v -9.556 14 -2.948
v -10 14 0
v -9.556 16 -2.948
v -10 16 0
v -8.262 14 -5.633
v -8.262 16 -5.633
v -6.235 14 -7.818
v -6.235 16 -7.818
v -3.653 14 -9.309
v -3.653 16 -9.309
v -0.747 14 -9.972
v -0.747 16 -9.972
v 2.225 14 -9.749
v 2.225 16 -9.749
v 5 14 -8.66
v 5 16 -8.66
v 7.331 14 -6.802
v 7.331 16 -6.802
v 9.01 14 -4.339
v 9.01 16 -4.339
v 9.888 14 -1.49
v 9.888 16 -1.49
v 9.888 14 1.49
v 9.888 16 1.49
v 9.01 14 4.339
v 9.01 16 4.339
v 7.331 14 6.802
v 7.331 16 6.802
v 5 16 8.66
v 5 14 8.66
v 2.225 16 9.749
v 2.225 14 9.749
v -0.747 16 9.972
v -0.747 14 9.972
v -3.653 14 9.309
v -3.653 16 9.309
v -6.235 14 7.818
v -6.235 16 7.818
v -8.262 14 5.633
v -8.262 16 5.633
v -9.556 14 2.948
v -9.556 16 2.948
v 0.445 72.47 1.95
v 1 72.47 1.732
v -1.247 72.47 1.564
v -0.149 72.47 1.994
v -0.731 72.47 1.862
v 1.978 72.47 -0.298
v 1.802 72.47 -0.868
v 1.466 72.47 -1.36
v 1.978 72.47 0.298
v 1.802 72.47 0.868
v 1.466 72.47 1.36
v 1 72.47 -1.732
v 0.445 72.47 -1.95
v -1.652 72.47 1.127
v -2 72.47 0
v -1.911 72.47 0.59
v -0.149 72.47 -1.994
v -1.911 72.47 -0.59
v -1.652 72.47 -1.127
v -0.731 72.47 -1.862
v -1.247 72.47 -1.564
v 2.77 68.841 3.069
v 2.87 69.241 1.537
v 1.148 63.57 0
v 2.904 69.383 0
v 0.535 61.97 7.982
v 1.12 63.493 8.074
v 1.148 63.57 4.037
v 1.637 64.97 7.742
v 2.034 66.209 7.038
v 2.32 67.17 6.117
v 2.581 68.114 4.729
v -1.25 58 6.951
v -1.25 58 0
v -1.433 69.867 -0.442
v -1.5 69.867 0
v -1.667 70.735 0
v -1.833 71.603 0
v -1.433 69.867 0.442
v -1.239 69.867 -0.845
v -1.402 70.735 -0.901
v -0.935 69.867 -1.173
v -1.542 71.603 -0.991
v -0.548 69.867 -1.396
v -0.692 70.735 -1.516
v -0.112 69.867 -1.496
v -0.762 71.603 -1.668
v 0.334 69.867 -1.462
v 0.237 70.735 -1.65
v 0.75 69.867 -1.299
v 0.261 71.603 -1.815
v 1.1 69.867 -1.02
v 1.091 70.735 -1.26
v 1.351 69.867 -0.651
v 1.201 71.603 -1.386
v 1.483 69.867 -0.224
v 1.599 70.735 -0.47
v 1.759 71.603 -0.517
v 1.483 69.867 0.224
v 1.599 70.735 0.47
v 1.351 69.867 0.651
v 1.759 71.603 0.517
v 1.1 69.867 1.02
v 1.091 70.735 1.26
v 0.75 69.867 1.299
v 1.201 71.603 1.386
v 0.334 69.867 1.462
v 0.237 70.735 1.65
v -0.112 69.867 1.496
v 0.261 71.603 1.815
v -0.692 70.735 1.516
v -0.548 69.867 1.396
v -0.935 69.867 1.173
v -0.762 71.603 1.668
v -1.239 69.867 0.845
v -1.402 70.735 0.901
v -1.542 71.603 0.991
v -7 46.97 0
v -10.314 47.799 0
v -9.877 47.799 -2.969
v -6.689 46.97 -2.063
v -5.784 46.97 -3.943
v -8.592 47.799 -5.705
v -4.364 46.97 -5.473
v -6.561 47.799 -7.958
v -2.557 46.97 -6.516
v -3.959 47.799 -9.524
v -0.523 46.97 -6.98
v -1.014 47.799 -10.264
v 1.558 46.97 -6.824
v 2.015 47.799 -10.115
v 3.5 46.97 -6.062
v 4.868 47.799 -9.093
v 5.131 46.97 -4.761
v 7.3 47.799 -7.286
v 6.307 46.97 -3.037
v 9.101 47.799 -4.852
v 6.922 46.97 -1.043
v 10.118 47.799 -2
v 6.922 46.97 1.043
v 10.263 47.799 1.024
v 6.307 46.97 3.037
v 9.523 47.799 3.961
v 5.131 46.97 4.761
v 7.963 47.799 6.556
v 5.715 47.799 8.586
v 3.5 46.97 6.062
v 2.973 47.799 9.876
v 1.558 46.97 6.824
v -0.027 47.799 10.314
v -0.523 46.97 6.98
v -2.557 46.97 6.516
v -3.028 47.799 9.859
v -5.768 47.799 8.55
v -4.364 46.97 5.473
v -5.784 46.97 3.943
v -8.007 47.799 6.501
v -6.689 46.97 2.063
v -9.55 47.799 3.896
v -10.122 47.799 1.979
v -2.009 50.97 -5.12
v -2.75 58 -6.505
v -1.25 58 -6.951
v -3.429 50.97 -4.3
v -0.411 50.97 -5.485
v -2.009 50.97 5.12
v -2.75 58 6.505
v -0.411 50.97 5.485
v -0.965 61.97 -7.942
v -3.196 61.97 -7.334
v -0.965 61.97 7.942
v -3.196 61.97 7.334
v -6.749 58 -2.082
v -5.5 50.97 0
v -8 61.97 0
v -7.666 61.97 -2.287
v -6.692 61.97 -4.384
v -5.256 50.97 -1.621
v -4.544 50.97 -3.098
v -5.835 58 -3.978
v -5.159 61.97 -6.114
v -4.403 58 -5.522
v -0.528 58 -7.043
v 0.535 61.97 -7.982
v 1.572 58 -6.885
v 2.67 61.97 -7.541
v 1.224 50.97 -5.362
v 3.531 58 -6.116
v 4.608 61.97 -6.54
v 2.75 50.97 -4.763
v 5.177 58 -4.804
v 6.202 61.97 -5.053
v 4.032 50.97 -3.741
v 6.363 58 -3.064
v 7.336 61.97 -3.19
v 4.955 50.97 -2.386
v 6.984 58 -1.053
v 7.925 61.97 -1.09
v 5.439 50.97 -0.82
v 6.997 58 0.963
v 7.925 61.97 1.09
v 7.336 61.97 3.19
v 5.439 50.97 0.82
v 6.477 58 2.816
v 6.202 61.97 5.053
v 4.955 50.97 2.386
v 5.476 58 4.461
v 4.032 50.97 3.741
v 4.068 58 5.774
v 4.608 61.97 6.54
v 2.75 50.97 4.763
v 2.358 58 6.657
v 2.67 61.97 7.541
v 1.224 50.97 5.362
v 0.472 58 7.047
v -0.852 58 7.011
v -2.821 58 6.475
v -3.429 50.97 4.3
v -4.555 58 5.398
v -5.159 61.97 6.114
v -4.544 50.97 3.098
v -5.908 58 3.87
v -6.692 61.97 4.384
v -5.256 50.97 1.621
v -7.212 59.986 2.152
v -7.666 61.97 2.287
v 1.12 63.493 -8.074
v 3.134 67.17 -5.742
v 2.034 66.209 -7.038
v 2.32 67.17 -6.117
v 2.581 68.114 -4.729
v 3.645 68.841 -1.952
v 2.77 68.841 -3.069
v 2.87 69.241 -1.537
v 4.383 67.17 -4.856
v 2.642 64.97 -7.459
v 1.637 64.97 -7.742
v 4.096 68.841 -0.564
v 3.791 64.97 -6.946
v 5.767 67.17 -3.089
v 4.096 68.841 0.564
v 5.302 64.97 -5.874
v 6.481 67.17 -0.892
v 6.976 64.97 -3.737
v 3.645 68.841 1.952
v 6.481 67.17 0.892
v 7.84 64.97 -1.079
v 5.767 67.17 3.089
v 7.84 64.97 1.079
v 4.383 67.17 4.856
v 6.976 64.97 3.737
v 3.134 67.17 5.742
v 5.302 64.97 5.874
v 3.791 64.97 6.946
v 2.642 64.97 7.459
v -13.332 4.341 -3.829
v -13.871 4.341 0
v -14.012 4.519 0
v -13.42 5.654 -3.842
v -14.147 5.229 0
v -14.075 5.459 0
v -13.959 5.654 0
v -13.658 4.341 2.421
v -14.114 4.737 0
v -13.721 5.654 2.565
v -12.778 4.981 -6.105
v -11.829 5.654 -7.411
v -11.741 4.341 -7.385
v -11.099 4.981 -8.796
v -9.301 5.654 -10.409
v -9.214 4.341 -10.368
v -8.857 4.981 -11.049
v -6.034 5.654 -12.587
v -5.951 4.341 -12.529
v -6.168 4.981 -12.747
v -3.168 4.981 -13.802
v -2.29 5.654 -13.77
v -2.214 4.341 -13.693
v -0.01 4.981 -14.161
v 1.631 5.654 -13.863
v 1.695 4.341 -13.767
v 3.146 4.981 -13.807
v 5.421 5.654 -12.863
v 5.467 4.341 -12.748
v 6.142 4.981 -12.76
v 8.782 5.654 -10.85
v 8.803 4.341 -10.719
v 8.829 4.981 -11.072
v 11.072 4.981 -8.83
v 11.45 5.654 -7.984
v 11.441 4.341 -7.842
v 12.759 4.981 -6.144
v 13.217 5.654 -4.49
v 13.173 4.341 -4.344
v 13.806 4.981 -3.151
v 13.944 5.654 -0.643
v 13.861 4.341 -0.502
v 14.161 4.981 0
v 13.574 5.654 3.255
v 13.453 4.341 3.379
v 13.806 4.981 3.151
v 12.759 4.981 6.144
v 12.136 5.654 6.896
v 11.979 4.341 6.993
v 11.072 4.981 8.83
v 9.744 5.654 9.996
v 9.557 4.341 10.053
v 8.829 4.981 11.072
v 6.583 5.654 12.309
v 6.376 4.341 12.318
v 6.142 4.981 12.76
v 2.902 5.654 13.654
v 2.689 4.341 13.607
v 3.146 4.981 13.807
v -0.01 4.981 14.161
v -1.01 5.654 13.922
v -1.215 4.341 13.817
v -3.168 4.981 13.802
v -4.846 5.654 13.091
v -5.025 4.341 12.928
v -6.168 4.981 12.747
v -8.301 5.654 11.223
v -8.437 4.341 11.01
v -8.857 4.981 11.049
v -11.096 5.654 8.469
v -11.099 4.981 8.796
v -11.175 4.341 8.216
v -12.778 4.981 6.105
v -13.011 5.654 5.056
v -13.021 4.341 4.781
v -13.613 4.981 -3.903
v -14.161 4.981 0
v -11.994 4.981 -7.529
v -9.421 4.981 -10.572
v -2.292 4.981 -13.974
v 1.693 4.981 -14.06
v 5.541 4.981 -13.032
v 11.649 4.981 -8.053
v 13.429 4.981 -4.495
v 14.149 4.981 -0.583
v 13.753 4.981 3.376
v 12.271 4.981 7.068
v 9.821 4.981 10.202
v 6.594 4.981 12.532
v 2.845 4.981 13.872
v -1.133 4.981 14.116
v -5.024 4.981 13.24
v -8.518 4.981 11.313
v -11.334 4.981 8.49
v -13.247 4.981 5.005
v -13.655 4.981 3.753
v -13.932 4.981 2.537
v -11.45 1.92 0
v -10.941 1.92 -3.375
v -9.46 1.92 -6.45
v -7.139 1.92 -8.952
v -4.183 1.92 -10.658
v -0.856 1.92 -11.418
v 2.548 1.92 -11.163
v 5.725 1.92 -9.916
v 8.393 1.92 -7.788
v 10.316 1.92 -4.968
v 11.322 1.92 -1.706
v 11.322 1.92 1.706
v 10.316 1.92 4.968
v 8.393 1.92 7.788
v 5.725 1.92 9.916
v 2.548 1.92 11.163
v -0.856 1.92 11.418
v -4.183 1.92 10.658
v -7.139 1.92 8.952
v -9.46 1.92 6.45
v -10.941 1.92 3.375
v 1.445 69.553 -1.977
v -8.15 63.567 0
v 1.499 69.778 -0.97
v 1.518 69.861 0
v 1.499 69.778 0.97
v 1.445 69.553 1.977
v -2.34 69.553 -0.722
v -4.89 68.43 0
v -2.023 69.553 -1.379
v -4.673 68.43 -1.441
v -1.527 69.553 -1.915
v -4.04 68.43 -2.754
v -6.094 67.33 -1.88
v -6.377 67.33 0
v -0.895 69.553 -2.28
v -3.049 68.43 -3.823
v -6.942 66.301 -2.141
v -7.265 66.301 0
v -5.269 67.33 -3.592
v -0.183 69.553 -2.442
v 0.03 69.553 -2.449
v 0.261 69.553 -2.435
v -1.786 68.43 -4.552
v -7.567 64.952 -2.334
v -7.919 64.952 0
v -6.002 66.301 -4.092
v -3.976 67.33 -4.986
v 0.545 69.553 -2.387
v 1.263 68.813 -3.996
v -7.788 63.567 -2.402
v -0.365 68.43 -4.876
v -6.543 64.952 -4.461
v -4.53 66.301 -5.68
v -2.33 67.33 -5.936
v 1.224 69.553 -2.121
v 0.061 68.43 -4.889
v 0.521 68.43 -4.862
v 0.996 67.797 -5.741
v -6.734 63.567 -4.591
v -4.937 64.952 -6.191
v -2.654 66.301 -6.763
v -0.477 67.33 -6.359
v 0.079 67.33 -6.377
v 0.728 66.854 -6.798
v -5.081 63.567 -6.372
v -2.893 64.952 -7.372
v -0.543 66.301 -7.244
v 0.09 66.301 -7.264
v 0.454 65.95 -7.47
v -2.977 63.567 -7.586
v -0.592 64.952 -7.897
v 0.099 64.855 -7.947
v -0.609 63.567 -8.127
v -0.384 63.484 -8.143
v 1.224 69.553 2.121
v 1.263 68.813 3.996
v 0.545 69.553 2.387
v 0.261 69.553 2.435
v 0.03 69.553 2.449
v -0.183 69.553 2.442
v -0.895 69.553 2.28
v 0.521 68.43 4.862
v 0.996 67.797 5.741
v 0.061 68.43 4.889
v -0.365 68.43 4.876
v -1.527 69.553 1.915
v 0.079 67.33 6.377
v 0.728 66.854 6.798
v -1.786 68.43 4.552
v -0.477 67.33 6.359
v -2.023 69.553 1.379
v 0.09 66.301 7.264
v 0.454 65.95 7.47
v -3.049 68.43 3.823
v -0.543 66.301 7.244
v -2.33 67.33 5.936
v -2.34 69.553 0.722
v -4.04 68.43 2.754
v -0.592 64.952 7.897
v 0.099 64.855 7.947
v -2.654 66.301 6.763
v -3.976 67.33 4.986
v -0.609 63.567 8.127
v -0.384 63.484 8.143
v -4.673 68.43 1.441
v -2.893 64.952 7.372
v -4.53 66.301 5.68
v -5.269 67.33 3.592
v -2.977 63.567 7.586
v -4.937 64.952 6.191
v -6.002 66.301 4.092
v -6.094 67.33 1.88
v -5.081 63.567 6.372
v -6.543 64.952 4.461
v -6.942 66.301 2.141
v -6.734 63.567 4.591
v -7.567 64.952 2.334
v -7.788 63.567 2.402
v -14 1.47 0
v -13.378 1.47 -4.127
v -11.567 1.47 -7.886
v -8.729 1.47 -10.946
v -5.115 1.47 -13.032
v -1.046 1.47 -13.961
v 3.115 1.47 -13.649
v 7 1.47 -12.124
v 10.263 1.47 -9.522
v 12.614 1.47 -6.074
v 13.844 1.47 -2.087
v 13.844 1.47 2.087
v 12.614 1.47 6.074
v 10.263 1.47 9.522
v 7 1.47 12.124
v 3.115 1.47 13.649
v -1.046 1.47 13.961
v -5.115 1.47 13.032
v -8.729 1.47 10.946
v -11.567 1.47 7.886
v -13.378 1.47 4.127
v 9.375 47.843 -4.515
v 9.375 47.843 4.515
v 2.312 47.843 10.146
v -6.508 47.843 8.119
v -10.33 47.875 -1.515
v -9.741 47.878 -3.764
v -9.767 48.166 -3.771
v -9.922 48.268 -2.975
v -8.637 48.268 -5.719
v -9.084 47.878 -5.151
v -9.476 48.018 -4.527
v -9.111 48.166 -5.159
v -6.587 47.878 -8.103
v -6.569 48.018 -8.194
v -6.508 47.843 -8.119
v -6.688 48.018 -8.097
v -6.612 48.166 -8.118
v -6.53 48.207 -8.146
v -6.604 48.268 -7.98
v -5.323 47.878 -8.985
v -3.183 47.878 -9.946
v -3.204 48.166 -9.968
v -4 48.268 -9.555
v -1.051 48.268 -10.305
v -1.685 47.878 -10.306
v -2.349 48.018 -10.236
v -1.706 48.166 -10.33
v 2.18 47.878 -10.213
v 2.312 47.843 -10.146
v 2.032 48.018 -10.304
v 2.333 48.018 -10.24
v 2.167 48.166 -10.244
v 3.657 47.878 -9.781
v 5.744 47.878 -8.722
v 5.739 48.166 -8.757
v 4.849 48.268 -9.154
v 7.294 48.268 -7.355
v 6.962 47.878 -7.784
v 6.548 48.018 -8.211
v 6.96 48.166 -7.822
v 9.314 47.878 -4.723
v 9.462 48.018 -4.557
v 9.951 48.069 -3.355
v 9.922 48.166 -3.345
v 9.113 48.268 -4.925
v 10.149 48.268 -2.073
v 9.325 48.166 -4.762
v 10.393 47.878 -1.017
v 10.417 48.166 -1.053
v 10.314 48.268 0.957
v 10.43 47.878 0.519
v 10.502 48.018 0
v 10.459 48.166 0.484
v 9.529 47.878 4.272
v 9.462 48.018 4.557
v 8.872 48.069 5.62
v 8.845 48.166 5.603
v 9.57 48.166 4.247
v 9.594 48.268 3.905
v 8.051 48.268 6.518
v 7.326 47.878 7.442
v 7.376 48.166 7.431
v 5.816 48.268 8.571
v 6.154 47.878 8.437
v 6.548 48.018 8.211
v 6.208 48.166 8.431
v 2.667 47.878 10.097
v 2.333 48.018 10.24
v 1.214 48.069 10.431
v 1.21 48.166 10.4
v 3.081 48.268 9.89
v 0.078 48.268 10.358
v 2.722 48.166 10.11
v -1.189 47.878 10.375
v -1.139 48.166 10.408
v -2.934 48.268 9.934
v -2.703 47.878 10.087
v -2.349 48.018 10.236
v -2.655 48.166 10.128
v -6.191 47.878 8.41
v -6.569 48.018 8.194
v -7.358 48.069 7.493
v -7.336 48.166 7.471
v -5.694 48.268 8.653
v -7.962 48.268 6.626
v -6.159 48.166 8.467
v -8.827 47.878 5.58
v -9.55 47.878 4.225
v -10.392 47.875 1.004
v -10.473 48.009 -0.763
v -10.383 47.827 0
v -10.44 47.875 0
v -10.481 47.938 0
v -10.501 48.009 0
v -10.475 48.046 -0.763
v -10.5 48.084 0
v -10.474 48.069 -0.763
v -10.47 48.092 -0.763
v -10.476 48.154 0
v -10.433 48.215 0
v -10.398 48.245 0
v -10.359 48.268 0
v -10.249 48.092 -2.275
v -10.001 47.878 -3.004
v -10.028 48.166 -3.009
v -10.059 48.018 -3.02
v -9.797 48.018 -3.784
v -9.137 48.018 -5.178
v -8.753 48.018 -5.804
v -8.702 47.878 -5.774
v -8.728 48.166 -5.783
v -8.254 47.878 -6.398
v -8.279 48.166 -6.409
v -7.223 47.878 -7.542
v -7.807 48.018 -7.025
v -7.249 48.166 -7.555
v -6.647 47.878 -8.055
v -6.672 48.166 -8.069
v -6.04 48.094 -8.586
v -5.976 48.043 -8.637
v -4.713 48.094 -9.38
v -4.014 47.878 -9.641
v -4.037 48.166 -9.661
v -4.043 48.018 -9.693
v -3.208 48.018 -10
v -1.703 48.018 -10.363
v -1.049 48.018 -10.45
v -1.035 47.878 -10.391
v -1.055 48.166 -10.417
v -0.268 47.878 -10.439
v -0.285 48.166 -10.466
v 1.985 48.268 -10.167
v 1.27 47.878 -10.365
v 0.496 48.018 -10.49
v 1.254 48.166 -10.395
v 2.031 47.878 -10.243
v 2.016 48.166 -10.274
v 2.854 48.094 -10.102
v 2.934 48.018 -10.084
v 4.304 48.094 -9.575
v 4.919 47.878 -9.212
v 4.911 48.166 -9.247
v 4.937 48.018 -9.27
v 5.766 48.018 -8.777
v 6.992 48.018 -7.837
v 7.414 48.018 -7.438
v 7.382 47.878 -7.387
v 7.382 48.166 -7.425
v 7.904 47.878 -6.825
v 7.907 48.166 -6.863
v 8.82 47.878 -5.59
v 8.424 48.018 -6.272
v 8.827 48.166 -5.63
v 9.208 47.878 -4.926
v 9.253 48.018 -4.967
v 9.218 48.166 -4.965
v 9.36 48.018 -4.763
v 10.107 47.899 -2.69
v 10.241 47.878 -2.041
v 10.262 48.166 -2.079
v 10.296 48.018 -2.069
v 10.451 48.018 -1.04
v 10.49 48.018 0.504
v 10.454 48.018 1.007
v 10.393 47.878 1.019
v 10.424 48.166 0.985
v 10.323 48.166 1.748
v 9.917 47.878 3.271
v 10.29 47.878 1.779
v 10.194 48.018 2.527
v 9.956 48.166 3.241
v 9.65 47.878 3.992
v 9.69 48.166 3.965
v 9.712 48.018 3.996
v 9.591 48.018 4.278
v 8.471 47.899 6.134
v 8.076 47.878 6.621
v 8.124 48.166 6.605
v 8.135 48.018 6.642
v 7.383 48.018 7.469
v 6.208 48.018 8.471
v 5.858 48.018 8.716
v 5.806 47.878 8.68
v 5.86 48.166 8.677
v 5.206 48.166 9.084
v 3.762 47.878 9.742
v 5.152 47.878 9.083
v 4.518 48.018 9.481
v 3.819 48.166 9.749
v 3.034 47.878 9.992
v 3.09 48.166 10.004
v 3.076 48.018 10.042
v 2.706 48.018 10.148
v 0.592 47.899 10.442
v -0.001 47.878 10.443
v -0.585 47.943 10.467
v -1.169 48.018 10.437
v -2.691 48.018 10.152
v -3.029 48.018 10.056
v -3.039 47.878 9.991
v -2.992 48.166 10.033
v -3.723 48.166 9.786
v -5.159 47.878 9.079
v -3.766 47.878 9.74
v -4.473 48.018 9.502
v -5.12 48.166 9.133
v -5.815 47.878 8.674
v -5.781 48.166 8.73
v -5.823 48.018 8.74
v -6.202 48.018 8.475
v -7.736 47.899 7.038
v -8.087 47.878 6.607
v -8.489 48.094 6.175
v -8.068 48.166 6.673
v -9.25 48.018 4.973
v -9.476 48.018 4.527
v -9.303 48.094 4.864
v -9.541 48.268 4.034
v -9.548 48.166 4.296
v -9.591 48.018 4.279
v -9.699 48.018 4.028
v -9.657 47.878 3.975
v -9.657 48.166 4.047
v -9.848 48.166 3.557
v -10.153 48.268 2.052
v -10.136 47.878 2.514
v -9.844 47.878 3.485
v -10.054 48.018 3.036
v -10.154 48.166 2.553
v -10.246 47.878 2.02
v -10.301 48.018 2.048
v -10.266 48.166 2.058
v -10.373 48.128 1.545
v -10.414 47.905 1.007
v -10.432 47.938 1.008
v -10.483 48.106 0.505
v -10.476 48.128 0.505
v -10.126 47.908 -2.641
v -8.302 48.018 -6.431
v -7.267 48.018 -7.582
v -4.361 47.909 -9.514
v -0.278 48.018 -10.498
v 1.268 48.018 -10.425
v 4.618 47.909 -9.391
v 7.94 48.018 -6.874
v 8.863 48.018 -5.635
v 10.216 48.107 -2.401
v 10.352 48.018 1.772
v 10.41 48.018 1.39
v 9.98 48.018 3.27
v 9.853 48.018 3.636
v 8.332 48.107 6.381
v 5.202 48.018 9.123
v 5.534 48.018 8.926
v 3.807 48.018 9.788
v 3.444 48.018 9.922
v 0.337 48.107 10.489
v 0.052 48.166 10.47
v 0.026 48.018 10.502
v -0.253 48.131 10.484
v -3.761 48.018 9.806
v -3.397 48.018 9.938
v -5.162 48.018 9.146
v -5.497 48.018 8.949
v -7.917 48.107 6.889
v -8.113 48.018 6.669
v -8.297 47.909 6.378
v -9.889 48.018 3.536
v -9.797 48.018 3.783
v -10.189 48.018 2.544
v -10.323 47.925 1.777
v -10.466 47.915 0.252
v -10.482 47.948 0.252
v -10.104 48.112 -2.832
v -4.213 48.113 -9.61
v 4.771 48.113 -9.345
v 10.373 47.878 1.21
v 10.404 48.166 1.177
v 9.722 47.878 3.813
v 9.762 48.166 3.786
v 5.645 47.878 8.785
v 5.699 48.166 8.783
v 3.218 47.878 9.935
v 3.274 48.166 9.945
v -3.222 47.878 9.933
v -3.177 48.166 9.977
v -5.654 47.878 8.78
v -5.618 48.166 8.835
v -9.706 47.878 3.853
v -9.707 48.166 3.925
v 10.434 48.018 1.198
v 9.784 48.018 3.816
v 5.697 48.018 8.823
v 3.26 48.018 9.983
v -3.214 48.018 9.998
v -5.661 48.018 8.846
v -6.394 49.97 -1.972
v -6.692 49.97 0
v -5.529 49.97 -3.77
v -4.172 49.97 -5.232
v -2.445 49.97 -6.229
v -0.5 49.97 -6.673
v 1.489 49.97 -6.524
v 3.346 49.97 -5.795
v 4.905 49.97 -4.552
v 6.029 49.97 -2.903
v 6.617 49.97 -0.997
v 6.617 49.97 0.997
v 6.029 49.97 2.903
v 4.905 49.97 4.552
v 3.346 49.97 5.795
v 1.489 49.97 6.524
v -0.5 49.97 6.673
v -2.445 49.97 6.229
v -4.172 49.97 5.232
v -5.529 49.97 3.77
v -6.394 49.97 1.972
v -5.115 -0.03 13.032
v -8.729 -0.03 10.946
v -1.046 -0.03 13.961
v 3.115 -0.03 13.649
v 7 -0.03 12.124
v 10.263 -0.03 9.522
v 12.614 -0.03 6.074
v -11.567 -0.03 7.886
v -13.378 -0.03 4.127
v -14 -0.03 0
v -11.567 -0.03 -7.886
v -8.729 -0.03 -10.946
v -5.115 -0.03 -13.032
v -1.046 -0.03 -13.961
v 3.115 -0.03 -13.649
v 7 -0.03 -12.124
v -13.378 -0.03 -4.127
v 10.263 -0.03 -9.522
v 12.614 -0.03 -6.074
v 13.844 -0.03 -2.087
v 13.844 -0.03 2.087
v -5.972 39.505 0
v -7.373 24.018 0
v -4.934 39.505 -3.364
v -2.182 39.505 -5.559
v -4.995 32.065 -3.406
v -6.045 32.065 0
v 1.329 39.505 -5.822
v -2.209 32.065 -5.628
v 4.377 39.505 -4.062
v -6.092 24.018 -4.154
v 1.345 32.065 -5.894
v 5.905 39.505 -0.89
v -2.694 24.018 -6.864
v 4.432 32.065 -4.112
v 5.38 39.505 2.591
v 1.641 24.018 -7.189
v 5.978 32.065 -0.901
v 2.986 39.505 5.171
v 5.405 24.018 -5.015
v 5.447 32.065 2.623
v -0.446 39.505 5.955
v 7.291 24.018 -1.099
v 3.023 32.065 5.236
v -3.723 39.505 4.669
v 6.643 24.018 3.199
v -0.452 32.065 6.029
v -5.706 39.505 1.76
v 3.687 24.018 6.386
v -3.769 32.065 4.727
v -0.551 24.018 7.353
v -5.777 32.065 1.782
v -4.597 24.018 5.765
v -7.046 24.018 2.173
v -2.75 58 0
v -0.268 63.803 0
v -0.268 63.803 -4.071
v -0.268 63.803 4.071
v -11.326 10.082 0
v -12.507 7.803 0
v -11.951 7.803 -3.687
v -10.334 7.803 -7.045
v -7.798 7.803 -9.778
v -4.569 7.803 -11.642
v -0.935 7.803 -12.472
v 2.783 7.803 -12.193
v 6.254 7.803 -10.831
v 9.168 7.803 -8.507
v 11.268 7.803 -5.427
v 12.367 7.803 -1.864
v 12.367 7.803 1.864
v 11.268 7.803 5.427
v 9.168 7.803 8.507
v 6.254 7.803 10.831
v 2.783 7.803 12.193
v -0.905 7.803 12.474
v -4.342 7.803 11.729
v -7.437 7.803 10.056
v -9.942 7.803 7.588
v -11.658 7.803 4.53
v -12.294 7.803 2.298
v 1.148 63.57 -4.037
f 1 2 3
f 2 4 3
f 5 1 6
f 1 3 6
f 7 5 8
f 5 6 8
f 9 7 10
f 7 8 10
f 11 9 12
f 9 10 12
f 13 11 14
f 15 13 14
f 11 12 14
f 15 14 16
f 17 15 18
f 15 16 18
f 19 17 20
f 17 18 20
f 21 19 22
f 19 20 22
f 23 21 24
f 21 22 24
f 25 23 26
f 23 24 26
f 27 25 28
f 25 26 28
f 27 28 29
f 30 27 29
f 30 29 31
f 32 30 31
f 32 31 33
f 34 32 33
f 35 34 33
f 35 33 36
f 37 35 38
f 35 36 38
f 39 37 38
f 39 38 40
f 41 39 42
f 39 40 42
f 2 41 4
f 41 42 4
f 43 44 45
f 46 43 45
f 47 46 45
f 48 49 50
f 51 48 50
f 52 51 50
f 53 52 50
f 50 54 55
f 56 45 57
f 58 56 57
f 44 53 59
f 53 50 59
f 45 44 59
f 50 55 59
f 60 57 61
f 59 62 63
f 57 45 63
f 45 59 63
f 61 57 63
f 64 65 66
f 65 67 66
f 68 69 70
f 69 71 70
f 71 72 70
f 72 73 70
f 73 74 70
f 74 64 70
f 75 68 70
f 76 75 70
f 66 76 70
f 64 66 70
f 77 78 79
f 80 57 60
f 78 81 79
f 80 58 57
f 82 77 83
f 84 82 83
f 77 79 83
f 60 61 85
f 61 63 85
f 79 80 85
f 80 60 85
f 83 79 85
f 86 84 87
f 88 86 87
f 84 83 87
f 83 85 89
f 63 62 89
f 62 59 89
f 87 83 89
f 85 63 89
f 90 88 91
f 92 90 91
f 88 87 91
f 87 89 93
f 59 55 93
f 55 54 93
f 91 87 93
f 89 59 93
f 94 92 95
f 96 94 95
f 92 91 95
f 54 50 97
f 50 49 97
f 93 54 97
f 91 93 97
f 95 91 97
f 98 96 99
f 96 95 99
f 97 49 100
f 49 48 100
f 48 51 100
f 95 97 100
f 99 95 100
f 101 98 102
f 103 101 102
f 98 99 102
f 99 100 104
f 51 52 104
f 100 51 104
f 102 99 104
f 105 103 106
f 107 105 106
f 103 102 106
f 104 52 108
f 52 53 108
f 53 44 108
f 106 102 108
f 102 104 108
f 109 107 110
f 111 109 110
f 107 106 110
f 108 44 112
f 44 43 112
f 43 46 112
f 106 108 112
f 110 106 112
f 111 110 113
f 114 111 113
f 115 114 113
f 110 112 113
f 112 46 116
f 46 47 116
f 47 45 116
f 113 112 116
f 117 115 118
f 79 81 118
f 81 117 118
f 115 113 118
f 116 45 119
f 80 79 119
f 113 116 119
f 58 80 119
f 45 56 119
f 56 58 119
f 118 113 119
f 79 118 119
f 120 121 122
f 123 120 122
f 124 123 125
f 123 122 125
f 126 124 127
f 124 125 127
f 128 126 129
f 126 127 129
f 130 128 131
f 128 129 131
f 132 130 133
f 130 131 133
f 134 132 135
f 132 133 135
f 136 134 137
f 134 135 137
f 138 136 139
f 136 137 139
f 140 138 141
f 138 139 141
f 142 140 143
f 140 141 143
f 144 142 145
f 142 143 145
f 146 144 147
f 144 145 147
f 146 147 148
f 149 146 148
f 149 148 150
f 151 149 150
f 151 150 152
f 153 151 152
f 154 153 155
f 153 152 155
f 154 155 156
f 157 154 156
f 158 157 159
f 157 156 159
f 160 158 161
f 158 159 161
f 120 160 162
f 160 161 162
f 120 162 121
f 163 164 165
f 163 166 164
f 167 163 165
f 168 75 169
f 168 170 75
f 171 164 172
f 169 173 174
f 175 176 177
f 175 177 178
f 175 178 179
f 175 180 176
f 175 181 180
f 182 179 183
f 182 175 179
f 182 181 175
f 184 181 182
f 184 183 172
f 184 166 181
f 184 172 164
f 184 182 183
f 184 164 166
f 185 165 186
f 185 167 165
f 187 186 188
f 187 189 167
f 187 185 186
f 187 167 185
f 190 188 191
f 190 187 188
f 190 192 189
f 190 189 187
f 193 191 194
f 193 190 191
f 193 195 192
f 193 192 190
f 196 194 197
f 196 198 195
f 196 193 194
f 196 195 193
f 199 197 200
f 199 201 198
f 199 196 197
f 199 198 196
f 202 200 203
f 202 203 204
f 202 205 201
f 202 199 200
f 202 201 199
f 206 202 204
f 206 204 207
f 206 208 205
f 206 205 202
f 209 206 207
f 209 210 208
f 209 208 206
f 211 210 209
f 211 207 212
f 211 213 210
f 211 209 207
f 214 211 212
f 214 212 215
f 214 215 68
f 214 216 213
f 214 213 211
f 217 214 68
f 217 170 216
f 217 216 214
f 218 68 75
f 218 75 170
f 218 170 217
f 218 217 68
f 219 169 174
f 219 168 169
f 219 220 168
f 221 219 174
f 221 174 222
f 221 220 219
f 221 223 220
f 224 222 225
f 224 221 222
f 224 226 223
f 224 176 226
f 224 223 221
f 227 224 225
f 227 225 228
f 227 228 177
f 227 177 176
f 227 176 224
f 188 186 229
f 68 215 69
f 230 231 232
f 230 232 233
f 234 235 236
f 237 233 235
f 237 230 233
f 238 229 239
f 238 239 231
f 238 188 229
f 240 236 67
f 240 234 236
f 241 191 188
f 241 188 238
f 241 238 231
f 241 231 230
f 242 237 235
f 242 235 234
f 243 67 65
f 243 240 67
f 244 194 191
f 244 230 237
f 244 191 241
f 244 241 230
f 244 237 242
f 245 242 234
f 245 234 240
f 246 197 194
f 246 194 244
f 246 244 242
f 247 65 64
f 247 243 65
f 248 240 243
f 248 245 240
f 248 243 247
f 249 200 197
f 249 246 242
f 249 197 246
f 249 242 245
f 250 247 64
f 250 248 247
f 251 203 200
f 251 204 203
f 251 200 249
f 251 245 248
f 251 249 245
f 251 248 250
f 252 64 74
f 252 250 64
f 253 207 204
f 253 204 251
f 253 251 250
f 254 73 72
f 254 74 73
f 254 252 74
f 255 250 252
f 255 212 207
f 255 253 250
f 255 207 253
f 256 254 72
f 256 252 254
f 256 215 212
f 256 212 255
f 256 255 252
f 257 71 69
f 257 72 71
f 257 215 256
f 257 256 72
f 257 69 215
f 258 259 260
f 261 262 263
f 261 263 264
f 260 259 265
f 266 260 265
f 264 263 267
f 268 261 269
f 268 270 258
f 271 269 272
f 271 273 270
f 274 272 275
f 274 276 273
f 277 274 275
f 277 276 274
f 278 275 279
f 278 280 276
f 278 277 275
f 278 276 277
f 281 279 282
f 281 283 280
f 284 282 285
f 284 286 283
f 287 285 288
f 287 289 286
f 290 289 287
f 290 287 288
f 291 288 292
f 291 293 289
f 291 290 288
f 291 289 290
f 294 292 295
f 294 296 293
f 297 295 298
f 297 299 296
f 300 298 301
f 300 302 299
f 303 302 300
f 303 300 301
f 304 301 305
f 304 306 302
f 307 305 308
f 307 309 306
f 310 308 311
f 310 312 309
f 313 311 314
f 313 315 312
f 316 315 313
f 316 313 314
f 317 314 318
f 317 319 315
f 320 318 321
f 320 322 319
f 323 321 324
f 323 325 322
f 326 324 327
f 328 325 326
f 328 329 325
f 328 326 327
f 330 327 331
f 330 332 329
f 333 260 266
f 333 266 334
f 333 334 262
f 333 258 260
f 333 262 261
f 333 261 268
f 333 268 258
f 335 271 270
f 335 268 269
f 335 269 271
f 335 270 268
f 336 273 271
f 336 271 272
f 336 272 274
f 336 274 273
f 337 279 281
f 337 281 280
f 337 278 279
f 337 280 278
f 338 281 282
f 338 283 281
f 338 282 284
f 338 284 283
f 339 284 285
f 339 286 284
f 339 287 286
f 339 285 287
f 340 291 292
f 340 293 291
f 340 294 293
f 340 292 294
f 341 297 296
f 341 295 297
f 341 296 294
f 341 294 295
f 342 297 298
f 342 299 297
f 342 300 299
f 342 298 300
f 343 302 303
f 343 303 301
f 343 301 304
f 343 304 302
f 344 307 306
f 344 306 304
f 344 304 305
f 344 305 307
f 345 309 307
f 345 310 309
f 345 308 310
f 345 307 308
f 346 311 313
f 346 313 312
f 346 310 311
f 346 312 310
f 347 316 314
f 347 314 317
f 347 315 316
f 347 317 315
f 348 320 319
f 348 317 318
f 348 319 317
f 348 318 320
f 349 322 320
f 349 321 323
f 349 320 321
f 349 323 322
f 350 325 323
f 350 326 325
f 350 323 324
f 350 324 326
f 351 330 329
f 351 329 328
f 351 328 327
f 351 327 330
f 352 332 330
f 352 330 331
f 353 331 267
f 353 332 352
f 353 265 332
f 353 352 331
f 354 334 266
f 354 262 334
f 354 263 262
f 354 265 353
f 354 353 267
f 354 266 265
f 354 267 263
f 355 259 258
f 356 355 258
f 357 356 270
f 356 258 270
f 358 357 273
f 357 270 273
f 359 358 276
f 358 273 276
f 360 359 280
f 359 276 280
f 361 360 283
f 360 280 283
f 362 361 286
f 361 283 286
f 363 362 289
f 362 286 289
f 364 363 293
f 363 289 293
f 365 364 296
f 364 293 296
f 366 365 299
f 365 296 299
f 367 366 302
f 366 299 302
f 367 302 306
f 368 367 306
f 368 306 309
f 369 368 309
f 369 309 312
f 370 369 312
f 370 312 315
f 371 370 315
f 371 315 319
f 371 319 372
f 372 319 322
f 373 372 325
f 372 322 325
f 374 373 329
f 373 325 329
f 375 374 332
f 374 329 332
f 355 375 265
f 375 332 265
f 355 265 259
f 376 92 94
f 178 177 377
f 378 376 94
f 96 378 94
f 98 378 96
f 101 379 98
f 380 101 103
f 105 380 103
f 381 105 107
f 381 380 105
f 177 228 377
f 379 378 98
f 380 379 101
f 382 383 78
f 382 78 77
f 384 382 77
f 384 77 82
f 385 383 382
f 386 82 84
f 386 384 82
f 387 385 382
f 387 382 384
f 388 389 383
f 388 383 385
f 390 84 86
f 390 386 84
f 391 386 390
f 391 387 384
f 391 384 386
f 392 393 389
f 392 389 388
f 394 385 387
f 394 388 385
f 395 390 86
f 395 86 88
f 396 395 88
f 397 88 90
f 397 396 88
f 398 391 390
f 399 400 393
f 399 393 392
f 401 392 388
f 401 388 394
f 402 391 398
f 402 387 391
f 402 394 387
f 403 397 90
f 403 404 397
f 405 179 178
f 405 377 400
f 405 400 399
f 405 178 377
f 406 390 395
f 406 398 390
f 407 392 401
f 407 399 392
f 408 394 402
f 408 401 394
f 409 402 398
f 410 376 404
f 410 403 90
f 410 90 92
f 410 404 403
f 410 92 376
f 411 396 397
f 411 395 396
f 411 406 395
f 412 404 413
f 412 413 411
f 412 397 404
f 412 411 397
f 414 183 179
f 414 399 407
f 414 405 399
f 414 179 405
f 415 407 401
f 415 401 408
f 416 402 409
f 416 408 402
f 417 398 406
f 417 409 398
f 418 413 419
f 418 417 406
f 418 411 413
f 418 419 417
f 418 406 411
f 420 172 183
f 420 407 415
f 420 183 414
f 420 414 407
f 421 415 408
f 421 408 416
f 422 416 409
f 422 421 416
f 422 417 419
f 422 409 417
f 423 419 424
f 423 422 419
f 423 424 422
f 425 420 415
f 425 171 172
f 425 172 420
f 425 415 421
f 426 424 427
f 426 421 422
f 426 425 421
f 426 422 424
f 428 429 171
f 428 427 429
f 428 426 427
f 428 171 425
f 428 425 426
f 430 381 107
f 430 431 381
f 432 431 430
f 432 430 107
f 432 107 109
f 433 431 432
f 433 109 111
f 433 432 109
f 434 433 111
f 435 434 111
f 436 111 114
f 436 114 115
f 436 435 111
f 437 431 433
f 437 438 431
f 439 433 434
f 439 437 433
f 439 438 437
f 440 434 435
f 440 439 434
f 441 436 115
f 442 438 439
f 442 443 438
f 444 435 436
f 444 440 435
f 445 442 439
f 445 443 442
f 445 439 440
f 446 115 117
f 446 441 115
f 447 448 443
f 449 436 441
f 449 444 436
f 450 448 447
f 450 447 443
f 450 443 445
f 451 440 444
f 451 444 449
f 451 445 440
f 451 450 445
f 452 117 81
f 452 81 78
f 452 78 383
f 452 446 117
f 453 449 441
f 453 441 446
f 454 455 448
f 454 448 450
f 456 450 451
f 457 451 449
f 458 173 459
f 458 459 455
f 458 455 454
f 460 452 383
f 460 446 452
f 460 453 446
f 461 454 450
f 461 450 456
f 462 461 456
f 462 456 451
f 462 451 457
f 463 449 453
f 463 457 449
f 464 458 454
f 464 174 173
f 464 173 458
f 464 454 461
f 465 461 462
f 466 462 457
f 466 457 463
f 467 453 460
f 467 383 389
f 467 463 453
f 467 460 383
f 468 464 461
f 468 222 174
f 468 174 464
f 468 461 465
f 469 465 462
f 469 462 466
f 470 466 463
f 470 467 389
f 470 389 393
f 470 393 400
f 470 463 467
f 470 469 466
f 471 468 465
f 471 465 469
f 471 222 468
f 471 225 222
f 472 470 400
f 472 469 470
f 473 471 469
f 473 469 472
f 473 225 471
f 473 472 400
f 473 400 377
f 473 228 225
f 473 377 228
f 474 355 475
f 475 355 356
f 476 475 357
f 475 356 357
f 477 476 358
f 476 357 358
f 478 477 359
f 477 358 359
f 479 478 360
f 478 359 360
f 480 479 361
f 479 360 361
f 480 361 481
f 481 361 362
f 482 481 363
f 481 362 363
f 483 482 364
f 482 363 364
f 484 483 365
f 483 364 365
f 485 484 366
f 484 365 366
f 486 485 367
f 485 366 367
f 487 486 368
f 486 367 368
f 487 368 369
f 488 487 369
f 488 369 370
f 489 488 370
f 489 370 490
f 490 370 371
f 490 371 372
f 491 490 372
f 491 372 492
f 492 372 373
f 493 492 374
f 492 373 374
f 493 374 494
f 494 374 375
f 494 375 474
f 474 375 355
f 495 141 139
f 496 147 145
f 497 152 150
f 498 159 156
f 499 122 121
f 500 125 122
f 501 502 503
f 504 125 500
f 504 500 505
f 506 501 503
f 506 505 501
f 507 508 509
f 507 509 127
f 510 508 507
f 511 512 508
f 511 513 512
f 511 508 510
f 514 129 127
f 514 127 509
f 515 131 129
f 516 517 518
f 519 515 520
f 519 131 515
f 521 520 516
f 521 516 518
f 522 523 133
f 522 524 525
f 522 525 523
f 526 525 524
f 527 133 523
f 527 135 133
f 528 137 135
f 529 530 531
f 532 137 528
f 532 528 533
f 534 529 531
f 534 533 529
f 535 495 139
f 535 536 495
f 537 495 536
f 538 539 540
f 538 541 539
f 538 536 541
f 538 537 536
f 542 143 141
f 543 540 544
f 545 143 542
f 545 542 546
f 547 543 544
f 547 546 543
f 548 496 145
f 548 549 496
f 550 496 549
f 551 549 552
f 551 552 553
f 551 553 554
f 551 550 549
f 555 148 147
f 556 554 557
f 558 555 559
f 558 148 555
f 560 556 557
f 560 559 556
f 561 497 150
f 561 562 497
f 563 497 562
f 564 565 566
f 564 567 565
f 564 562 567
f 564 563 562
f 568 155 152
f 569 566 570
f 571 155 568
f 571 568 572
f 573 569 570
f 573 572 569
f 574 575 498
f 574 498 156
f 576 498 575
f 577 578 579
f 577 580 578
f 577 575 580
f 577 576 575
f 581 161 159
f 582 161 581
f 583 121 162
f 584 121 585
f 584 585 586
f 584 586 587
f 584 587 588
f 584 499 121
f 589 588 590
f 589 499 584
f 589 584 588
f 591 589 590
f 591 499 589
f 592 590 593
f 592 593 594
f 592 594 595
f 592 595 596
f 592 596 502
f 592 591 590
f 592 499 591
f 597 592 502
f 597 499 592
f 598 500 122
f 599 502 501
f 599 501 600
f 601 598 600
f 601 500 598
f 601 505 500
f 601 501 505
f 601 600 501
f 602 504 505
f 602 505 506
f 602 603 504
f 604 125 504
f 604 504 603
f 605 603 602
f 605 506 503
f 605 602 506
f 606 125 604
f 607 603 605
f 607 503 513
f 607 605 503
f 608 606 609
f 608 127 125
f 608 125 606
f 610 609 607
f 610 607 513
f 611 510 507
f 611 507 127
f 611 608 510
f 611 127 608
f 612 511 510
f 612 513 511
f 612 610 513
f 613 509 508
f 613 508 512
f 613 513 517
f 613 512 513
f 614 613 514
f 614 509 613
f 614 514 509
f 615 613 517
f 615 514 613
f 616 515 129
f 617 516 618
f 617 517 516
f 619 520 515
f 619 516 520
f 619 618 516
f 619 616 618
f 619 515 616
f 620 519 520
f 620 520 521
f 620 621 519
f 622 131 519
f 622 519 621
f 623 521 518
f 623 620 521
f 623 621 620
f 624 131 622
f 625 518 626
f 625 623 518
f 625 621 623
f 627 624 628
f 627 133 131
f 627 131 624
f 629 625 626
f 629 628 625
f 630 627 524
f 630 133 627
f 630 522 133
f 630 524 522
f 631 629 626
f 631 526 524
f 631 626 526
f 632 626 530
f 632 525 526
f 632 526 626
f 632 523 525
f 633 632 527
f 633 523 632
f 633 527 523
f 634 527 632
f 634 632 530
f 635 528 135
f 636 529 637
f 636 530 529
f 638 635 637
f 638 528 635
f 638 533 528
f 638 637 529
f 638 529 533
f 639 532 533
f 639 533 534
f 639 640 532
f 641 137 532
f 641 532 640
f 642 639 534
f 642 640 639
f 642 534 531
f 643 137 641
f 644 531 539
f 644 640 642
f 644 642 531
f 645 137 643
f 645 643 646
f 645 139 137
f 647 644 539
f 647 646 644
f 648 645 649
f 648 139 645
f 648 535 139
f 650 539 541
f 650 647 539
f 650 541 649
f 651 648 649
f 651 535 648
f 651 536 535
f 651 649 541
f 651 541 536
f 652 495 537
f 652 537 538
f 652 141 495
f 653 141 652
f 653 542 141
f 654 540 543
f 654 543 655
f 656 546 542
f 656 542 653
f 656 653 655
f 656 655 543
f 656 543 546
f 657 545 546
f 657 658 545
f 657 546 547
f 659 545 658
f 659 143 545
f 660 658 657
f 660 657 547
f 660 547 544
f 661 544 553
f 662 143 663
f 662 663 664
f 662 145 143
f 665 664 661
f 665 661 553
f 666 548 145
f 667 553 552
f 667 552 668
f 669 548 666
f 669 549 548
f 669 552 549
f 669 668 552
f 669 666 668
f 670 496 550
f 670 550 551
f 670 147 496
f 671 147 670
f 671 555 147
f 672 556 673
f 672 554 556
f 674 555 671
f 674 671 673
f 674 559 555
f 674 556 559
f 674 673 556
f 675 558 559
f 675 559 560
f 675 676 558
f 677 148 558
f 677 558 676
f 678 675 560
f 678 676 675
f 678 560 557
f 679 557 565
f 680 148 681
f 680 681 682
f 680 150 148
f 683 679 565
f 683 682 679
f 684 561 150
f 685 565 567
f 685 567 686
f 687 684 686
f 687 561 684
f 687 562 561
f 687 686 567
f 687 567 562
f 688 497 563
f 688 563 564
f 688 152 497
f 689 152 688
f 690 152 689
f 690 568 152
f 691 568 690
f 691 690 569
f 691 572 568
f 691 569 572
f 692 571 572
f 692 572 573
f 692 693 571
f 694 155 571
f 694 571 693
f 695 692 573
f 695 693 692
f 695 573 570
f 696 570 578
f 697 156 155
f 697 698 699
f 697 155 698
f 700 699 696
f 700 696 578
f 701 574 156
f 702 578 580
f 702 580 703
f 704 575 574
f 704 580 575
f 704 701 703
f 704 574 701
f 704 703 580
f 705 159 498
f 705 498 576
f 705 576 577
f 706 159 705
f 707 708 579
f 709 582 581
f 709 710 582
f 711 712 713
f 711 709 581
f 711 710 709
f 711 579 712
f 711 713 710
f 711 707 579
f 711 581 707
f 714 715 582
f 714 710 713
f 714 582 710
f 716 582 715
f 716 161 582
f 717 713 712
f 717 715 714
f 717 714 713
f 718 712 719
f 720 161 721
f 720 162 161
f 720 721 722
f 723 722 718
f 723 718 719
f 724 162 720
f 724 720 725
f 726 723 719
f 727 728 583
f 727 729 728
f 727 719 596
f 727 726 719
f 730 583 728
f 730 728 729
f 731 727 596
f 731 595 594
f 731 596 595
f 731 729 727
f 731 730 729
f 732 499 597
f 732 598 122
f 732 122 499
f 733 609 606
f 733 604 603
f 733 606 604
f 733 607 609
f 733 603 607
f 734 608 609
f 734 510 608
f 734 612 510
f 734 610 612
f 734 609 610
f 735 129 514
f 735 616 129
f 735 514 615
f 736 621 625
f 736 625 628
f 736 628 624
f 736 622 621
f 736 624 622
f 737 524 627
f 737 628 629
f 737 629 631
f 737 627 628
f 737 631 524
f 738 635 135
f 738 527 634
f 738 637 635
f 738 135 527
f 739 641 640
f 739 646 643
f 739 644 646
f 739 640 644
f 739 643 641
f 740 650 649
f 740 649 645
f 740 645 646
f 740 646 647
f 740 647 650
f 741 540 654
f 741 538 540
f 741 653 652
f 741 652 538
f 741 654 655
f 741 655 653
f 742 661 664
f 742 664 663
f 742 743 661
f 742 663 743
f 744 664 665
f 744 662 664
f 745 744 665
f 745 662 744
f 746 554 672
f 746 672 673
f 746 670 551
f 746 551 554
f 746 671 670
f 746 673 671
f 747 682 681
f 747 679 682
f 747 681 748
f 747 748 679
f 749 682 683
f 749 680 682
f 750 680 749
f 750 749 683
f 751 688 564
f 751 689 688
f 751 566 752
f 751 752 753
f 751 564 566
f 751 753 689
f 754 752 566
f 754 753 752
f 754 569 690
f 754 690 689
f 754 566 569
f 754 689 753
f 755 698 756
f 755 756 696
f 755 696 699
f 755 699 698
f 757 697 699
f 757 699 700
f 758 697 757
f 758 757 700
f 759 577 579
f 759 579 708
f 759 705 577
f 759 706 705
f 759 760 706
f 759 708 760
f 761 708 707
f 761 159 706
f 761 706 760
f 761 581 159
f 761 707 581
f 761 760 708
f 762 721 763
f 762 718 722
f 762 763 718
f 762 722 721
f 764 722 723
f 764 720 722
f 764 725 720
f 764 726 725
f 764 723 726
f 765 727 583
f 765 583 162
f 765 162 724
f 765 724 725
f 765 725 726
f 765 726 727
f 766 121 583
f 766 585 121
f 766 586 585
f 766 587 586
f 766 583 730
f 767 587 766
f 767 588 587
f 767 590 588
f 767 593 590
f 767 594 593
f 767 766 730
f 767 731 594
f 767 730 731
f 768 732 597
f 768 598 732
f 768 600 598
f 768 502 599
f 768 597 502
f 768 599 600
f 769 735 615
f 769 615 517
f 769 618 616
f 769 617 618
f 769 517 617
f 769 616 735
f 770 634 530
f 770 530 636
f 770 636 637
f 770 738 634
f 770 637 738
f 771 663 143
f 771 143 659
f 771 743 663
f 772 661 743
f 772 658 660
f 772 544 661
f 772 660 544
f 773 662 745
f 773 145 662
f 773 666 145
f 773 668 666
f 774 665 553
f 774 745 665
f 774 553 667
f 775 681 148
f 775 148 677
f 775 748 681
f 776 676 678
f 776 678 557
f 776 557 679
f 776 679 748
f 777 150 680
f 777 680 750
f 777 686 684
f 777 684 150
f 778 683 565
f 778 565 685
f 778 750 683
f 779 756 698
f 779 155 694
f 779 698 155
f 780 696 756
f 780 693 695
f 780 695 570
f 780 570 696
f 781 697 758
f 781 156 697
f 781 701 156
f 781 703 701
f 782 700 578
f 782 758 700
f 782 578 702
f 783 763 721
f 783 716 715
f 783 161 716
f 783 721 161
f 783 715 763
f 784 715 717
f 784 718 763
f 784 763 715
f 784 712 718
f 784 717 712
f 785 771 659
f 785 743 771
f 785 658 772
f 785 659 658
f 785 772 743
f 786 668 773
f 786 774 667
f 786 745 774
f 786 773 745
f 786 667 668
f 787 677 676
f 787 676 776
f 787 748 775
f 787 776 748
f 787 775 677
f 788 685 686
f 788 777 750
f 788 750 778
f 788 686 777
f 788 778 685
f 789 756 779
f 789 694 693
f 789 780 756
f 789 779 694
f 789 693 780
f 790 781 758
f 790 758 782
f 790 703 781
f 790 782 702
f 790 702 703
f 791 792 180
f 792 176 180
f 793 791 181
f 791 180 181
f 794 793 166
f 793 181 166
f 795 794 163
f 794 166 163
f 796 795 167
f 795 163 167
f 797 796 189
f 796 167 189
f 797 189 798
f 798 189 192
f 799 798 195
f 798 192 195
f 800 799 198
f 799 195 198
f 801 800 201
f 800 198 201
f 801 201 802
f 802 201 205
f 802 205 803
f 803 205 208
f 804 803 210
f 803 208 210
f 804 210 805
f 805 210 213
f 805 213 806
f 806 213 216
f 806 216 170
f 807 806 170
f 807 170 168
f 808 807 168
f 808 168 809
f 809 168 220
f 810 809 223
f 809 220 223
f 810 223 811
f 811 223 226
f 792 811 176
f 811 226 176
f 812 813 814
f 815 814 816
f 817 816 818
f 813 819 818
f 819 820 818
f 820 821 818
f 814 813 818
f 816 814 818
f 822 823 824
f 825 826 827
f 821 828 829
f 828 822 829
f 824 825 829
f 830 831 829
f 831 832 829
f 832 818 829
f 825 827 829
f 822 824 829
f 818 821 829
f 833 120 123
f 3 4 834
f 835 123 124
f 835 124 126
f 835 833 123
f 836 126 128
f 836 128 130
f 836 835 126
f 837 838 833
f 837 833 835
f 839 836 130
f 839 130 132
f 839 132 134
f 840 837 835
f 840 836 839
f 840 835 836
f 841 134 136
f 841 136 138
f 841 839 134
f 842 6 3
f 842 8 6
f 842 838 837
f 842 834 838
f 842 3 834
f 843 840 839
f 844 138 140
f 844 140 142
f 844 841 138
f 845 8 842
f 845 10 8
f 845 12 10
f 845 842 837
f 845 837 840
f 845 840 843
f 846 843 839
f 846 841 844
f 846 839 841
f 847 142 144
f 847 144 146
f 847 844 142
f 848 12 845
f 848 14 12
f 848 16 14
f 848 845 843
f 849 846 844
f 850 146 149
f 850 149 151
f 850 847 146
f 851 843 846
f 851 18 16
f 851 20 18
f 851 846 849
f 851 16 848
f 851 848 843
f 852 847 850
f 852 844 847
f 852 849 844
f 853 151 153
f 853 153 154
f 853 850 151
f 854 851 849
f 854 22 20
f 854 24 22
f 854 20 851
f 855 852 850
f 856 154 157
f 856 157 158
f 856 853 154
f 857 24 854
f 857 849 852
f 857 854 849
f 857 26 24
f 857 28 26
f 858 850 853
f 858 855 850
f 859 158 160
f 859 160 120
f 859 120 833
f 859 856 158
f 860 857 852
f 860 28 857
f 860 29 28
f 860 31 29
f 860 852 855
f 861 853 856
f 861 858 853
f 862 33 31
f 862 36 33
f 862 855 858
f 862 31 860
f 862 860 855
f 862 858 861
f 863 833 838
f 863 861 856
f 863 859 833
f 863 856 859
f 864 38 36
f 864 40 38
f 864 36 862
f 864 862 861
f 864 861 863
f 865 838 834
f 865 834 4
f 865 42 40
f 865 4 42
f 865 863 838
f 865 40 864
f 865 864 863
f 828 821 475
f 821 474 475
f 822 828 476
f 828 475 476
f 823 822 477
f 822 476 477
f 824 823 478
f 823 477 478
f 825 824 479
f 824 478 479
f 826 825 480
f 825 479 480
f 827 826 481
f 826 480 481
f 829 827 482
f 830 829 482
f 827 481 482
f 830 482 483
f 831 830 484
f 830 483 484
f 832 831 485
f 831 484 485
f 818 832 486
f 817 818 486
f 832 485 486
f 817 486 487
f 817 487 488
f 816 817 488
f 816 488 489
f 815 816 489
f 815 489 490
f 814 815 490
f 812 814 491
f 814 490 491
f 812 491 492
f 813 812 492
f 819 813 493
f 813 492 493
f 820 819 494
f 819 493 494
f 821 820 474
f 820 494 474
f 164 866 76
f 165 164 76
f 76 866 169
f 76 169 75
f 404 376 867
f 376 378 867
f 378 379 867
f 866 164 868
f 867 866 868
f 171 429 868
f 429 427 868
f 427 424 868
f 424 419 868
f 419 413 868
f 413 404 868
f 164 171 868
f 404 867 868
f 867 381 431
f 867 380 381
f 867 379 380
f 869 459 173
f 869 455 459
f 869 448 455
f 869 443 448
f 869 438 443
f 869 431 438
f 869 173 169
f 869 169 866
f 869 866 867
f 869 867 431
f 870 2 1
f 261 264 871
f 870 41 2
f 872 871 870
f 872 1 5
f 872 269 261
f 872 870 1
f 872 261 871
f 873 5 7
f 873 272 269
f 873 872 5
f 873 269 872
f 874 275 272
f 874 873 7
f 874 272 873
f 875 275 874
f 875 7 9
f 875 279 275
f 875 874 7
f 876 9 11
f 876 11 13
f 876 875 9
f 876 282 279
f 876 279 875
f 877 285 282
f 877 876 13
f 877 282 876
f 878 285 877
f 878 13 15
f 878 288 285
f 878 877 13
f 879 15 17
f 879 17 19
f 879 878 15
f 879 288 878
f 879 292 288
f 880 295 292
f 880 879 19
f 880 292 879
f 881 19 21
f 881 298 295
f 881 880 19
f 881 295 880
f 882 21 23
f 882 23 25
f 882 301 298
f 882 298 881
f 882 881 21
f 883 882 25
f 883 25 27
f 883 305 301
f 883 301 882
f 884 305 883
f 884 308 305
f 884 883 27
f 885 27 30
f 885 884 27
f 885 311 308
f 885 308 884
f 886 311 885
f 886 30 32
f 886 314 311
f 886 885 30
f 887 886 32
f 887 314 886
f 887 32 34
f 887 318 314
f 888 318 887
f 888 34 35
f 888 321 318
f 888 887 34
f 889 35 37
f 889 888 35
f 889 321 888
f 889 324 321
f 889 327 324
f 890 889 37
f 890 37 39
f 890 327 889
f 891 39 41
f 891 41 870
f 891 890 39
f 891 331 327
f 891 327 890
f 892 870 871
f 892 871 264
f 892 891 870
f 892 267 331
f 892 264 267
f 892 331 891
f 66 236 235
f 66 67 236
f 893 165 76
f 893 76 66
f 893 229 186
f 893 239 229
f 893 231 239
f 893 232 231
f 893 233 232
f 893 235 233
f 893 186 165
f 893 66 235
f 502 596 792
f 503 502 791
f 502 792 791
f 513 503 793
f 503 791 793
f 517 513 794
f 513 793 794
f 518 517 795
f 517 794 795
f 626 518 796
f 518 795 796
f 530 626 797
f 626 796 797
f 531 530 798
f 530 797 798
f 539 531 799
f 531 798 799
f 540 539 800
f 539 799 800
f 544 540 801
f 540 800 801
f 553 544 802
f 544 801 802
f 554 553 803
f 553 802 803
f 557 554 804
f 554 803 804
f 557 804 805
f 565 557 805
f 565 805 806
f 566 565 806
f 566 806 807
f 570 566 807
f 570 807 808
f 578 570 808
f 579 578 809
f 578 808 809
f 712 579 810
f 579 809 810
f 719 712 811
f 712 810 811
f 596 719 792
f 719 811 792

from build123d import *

# Parameters (mm, degrees)
FILLET1_R          = 1
FILLET2_R          = 0.25
CUT_EXTRUDE1_DEPTH = 10


with BuildPart() as part:
    # Sketch2 → Revolve1 (revolve)
    with BuildSketch(Plane.XY, mode=Mode.PRIVATE) as revolve1_sk:
        with BuildLine():
            Line((0, -0.029632723), (14, -0.029632723))
            Line((14, -0.029632723), (14, 1.470367277))
            Line((14, 1.470367277), (11.449688693, 1.92005597))
            Line((11.449688693, 1.92005597), (14.5, 4.970367277))
            add(Edge.make_bspline(
                [(10, 13.999999824), (11.203056443, 8.982368861), (14.5, 4.970367277)],
                knots=[0, 0, 0, 1, 1, 1], degree=2))
            Line((10, 13.999999824), (10, 15.999999824))
            add(Edge.make_bspline(
                [(7, 46.970367277), (3.705746011, 31.376638376), (10, 15.999999824)],
                knots=[0, 0, 0, 1, 1, 1], degree=2))
            Line((7, 46.970367277), (11, 47.970367277))
            Line((11, 47.970367277), (6.691753593, 49.970367277))
            Line((6.691753593, 49.970367277), (5.5, 50.970367277))
            add(Edge.make_bspline(
                [(8, 61.970367277), (6.677745683, 56.486806933), (5.5, 50.970367277)],
                knots=[0, 0, 0, 1, 1, 1], degree=2))
            add(Edge.make_bspline(
                [(1.5, 69.866846509), (4.831181311, 68.851657083), (9.008205592, 66.74823561), (8, 61.970367277)],
                knots=[0, 0, 0, 0, 1, 1, 1, 1], degree=3))
            Line((1.5, 69.866846509), (2, 72.470367277))
            Line((2, 72.470367277), (0, 72.470367277))
            Line((0, 72.470367277), (0, 69.970367277))
            Line((0, 69.970367277), (0, -0.029632723))
        make_face()
    revolve(revolve1_sk.sketch.rotate(Axis((0, 69.970367277, 0), (0, -1, 0)), 180), axis=Axis((0, 69.970367277, 0), (0, -1, 0)))

    # Fillet1
    fillet1_edges = [part.edges().sort_by_distance(p)[0] for p in [
        (14.5, 4.970367277, 0),
    ]]
    fillet(fillet1_edges, radius=FILLET1_R)

    # Fillet2
    fillet2_edges = [part.edges().sort_by_distance(p)[0] for p in [
        (11, 47.970367277, 0),
    ]]
    fillet(fillet2_edges, radius=FILLET2_R)

    # Sketch5 → Cut-Extrude1 (cut, symmetric)
    with BuildSketch(Plane.XY):
        with BuildLine():
            Line((-2.75, 58), (-1.25, 58))
            add(Edge.make_bspline(
                [(3.05, 70), (1.609610391, 63.731525981), (-1.25, 58)],
                knots=[0, 0, 0, 1, 1, 1], degree=2))
            Line((3.05, 70), (1.55, 70))
            add(Edge.make_bspline(
                [(1.55, 70), (0.112471845, 63.739508889), (-2.75, 58)],
                knots=[0, 0, 0, 1, 1, 1], degree=2))
        make_face()
    extrude(amount=CUT_EXTRUDE1_DEPTH, both=True, mode=Mode.SUBTRACT)


solid = part.part
